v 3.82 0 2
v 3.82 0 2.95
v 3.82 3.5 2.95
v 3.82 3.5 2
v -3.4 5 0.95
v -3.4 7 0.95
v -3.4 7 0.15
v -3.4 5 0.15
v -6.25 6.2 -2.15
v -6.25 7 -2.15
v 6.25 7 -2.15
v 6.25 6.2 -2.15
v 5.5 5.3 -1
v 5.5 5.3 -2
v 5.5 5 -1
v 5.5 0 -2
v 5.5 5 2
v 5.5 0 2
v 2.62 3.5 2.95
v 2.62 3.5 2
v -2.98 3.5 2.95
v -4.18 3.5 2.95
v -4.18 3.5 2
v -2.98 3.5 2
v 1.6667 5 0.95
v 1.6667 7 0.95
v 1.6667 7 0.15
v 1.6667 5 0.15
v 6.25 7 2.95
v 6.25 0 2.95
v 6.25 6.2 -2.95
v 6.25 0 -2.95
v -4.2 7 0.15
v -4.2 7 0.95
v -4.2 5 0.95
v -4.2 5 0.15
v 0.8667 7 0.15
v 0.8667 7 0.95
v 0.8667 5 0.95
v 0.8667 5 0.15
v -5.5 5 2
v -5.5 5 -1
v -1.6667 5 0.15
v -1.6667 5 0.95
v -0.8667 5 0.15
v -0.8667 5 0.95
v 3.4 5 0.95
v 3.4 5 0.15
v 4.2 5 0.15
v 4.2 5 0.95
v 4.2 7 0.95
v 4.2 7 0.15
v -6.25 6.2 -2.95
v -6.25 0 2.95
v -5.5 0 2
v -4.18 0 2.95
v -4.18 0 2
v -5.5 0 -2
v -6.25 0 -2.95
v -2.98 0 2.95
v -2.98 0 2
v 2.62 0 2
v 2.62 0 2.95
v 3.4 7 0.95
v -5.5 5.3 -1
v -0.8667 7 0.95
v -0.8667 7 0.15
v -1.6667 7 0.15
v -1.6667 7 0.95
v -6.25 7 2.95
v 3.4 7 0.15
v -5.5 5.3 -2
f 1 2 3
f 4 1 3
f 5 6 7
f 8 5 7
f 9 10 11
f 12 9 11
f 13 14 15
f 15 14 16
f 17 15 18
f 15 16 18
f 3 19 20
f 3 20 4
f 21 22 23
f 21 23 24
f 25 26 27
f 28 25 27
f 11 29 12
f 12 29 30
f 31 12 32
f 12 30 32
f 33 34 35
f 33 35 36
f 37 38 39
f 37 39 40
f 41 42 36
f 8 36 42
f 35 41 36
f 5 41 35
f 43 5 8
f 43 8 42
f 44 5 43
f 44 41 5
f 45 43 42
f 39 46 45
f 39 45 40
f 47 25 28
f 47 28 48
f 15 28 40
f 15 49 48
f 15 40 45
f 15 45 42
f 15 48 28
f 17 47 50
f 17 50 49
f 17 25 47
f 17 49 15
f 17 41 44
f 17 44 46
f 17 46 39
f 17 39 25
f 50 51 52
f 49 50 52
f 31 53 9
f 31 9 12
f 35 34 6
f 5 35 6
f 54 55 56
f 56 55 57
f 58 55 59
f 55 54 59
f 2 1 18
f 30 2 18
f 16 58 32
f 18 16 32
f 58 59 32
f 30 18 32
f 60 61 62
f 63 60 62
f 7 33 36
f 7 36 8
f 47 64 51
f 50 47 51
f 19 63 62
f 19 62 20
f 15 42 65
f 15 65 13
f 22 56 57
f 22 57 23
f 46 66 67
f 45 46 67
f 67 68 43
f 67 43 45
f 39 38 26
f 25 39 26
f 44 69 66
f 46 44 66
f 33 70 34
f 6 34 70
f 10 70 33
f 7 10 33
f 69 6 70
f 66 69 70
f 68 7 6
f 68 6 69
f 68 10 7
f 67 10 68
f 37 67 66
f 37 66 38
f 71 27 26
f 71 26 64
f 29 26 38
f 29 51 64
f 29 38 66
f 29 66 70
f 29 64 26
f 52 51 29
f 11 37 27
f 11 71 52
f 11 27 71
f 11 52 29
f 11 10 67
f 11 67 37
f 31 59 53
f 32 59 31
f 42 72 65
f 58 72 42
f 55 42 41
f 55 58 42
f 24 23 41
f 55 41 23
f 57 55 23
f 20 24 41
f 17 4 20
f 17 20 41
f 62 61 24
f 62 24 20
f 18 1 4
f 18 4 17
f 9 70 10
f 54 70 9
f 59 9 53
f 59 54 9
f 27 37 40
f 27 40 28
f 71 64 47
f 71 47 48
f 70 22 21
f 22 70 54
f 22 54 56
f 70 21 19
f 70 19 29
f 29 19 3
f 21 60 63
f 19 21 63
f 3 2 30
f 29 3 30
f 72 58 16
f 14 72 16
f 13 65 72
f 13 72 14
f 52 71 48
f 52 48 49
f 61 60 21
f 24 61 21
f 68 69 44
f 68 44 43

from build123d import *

# Parameters (mm, degrees)
SKETCH1_W           = 12.5
SKETCH1_H           = 5.9
BOSS_EXTRUDE1_DEPTH = 7
SKETCH3_W           = 11
SKETCH3_H           = 4
CUT_EXTRUDE1_DEPTH  = 5
SKETCH4_W           = 1.2
SKETCH4_H           = 3.5
CUT_EXTRUDE2_DEPTH  = 4
SKETCH5_W           = 12.5
SKETCH5_H           = 0.8
CUT_EXTRUDE3_DEPTH  = 0.8
SKETCH6_W           = 0.8
SKETCH6_H           = 0.8
CUT_EXTRUDE4_DEPTH  = 10
SKETCH7_W           = 11
SKETCH7_H           = 1
CUT_EXTRUDE5_DEPTH  = 0.3


with BuildPart() as part:
    # Sketch1 → Boss-Extrude1 (new body)
    with BuildSketch(Plane(origin=(0, 0, 0), x_dir=(1, 0, 0), z_dir=(0, 1, 0))):
        Rectangle(SKETCH1_W, SKETCH1_H)
    extrude(amount=BOSS_EXTRUDE1_DEPTH)

    # Sketch3 → Cut-Extrude1 (cut)
    with BuildSketch(Plane.XZ):
        Rectangle(SKETCH3_W, SKETCH3_H)
    extrude(amount=-CUT_EXTRUDE1_DEPTH, mode=Mode.SUBTRACT)

    # Sketch4 → Cut-Extrude2 (cut)
    with BuildSketch(Plane.XY.offset(2.95)):
        with Locations((-3.58, 1.75)):
            Rectangle(SKETCH4_W, SKETCH4_H)
        with Locations((3.22, 1.75)):
            Rectangle(SKETCH4_W, SKETCH4_H)
    extrude(amount=-CUT_EXTRUDE2_DEPTH, mode=Mode.SUBTRACT)

    # Sketch5 → Cut-Extrude3 (cut)
    with BuildSketch(Plane(origin=(0, 7, 0), x_dir=(1, 0, 0), z_dir=(0, 1, 0))):
        with Locations((0, 2.55)):
            Rectangle(SKETCH5_W, SKETCH5_H)
    extrude(amount=-CUT_EXTRUDE3_DEPTH, mode=Mode.SUBTRACT)

    # Sketch6 → Cut-Extrude4 (cut)
    with BuildSketch(Plane(origin=(0, 7, 0), x_dir=(1, 0, 0), z_dir=(0, 1, 0))):
        with Locations((3.8, -0.55)):
            Rectangle(SKETCH6_W, SKETCH6_H)
        with Locations((1.266666667, -0.55)):
            Rectangle(SKETCH6_W, SKETCH6_H)
        with Locations((-1.266666667, -0.55)):
            Rectangle(SKETCH6_W, SKETCH6_H)
        with Locations((-3.8, -0.55)):
            Rectangle(SKETCH6_W, SKETCH6_H)
    extrude(amount=-CUT_EXTRUDE4_DEPTH, mode=Mode.SUBTRACT)

    # Sketch7 → Cut-Extrude5 (cut)
    with BuildSketch(Plane.XZ.offset(-5)):
        with Locations((0, -1.5)):
            Rectangle(SKETCH7_W, SKETCH7_H)
    extrude(amount=-CUT_EXTRUDE5_DEPTH, mode=Mode.SUBTRACT)


solid = part.part
